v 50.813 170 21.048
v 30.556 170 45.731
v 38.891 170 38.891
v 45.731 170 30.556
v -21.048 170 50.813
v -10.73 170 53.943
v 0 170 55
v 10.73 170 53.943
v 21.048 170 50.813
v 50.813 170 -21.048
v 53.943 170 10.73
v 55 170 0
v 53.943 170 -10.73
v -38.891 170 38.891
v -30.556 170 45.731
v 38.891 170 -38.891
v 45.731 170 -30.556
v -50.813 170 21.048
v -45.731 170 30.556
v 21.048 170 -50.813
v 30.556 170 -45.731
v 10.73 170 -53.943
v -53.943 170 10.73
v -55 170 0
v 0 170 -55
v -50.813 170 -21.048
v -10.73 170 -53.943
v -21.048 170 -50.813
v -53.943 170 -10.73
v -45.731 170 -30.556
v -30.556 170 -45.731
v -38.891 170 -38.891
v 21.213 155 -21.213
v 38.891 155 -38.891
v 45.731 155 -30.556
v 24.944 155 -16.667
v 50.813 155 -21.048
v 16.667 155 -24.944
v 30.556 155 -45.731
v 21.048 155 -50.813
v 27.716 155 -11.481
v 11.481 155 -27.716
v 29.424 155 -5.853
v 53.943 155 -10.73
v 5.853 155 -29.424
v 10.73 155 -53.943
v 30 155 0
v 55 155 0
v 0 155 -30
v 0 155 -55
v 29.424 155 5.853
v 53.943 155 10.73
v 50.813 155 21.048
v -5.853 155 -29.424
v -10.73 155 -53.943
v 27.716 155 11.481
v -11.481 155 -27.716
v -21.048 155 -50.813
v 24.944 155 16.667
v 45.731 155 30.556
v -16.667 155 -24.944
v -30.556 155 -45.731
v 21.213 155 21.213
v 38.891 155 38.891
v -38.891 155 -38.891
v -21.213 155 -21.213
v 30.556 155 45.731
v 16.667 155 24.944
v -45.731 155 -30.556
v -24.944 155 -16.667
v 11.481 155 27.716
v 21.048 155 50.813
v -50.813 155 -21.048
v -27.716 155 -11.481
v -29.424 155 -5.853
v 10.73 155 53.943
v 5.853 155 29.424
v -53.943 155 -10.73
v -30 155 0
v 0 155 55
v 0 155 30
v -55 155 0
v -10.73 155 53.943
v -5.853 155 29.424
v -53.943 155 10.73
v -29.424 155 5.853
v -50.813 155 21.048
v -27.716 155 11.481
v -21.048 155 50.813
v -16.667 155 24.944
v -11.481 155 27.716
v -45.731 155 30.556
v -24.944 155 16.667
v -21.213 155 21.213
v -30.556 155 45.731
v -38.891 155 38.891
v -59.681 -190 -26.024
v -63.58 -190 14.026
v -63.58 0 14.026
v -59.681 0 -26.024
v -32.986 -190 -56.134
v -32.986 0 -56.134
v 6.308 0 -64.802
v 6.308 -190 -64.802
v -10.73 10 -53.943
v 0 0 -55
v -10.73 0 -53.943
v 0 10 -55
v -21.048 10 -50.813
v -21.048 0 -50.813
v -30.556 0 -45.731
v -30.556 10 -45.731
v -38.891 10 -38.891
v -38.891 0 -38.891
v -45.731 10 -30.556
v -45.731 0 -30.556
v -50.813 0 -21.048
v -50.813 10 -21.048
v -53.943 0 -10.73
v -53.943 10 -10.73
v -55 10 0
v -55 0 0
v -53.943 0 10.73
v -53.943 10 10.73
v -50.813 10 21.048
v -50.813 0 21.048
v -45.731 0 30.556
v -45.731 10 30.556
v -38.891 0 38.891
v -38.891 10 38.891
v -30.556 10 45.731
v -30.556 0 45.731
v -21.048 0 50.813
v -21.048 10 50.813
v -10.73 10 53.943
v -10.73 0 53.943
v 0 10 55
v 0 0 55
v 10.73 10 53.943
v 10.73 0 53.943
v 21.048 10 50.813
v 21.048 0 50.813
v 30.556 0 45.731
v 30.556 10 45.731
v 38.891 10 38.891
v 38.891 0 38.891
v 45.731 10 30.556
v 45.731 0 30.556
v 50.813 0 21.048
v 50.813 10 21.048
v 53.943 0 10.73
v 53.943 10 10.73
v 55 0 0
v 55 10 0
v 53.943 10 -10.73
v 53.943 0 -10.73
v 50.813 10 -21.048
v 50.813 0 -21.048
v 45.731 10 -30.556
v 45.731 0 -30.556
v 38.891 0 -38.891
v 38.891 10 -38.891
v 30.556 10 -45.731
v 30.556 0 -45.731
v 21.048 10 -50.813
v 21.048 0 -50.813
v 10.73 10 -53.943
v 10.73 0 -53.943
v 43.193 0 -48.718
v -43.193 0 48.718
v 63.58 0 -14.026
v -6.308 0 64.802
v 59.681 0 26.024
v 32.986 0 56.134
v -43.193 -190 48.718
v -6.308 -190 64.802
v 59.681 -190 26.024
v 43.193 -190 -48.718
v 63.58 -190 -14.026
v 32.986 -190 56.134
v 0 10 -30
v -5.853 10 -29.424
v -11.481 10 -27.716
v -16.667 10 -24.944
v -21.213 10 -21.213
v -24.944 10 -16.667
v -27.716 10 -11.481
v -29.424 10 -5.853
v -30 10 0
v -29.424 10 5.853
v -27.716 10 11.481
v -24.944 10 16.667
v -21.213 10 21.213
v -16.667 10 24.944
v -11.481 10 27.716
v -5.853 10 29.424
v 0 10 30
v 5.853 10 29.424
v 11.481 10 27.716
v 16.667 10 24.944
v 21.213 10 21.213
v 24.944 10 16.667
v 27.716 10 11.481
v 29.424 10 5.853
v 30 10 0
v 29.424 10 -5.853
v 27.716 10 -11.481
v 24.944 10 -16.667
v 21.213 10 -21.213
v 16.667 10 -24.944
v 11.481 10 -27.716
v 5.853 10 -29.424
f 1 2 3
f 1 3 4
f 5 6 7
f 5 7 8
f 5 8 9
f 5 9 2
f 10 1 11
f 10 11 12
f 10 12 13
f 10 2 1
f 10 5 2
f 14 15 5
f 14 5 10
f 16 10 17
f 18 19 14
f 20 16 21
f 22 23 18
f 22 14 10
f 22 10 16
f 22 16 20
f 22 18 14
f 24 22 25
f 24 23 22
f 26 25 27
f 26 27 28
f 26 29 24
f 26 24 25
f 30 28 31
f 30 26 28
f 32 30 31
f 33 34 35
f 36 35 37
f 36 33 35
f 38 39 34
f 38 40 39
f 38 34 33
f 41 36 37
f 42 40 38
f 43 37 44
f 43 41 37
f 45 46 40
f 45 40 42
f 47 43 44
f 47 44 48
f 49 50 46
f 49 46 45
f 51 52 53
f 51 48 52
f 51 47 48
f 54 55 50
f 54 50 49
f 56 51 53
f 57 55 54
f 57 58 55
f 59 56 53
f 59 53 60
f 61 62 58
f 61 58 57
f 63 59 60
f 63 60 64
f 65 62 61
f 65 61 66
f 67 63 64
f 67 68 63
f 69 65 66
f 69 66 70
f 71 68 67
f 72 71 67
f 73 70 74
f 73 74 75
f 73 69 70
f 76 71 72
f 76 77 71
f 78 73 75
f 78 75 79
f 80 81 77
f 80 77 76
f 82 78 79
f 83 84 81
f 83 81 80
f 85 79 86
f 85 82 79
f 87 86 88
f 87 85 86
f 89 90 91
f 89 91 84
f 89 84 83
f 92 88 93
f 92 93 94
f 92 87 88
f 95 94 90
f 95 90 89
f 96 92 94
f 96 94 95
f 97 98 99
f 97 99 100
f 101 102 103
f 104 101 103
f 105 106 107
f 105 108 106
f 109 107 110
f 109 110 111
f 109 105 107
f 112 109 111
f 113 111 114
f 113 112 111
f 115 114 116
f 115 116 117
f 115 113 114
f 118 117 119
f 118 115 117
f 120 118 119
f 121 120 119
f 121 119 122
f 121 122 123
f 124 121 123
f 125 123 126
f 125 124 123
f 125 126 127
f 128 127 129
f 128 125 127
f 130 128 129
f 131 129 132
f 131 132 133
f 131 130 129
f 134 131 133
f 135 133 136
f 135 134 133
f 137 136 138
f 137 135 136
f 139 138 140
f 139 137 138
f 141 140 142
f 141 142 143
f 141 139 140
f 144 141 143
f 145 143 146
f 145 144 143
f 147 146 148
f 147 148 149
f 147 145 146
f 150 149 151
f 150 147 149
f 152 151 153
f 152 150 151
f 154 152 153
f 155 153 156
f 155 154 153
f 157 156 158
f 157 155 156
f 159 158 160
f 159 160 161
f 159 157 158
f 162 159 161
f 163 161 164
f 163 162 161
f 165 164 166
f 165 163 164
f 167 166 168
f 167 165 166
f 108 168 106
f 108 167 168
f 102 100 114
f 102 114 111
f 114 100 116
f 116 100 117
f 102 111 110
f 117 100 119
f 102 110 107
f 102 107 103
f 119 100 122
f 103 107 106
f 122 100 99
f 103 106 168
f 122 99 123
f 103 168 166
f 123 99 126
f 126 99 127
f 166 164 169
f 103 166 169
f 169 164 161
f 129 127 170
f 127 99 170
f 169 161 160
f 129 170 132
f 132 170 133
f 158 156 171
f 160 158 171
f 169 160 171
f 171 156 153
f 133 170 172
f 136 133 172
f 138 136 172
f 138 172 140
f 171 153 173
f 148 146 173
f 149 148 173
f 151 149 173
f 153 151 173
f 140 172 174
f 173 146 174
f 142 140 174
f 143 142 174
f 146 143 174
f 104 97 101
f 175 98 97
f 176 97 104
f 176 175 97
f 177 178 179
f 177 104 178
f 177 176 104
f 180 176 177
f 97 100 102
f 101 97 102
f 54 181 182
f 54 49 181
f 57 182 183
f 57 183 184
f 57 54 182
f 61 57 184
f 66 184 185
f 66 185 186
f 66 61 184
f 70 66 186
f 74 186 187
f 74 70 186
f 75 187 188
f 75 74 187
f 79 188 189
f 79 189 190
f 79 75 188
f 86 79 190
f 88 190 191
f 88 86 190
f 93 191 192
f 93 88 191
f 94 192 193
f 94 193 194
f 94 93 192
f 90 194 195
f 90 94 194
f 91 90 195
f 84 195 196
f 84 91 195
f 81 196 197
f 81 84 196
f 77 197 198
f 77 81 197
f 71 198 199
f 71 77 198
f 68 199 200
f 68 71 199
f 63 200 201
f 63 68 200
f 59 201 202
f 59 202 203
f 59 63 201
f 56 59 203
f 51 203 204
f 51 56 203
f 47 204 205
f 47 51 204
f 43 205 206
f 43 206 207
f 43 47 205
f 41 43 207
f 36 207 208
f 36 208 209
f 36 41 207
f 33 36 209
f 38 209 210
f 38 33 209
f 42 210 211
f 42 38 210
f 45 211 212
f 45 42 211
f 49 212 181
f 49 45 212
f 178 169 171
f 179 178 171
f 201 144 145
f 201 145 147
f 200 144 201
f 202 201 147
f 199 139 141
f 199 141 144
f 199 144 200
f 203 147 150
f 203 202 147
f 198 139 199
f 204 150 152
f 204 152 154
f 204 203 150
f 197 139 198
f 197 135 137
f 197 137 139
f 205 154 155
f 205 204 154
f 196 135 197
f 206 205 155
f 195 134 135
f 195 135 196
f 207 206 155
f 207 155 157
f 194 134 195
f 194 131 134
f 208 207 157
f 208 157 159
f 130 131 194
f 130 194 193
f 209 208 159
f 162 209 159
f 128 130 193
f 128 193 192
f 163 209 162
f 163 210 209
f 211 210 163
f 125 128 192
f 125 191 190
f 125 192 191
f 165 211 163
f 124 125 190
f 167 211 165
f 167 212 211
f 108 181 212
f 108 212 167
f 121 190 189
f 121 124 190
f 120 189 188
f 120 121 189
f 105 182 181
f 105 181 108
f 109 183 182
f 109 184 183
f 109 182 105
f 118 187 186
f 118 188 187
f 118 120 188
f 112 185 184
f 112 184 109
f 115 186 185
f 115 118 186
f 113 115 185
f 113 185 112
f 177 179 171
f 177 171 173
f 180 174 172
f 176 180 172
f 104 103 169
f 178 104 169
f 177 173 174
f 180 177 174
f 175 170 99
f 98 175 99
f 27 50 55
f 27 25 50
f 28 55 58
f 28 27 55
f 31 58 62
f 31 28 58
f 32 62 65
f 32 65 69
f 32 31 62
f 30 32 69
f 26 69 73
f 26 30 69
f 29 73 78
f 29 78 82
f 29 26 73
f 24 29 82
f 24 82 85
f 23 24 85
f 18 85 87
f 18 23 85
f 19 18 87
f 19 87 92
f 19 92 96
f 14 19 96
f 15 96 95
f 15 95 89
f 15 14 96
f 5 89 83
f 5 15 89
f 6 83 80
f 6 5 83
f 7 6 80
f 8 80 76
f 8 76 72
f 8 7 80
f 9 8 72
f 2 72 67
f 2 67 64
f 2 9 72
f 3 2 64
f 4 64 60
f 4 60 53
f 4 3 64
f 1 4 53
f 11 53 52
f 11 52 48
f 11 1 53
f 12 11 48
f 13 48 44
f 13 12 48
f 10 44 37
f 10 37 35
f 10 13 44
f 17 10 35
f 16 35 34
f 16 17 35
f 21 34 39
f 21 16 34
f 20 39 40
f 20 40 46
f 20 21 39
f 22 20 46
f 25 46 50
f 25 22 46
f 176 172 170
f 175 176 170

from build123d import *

# Parameters (mm, degrees)
EXTRUDE_2_DEPTH = 190


with BuildPart() as part:
    # Эскиз2 → Повернуть1 (revolve)
    with BuildSketch(Plane(origin=(0, 0, 0), x_dir=(0, 0, -1), z_dir=(1, 0, 0))):
        Polygon((0, 0), (55, 0), (55, 10), (30, 10), (30, 155), (55, 155), (55, 170), (0, 170), align=None)
    revolve(axis=Axis((0, -61.701185429, 0), (0, 1, 0)))

    # Эскиз3 → Бобышка-Вытянуть2 (add)
    with BuildSketch(Plane.XZ):
        Polygon((43.193084505, -48.718094896), (63.579717104, -14.025508632), (59.681058764, 26.024345221), (32.986264461, 56.133783734), (-6.308161704, 64.802024777), (-43.193084505, 48.718094896), (-63.579717104, 14.025508632), (-59.681058764, -26.024345221), (-32.986264461, -56.133783734), (6.308161704, -64.802024777), align=None)
    extrude(amount=EXTRUDE_2_DEPTH)


solid = part.part
